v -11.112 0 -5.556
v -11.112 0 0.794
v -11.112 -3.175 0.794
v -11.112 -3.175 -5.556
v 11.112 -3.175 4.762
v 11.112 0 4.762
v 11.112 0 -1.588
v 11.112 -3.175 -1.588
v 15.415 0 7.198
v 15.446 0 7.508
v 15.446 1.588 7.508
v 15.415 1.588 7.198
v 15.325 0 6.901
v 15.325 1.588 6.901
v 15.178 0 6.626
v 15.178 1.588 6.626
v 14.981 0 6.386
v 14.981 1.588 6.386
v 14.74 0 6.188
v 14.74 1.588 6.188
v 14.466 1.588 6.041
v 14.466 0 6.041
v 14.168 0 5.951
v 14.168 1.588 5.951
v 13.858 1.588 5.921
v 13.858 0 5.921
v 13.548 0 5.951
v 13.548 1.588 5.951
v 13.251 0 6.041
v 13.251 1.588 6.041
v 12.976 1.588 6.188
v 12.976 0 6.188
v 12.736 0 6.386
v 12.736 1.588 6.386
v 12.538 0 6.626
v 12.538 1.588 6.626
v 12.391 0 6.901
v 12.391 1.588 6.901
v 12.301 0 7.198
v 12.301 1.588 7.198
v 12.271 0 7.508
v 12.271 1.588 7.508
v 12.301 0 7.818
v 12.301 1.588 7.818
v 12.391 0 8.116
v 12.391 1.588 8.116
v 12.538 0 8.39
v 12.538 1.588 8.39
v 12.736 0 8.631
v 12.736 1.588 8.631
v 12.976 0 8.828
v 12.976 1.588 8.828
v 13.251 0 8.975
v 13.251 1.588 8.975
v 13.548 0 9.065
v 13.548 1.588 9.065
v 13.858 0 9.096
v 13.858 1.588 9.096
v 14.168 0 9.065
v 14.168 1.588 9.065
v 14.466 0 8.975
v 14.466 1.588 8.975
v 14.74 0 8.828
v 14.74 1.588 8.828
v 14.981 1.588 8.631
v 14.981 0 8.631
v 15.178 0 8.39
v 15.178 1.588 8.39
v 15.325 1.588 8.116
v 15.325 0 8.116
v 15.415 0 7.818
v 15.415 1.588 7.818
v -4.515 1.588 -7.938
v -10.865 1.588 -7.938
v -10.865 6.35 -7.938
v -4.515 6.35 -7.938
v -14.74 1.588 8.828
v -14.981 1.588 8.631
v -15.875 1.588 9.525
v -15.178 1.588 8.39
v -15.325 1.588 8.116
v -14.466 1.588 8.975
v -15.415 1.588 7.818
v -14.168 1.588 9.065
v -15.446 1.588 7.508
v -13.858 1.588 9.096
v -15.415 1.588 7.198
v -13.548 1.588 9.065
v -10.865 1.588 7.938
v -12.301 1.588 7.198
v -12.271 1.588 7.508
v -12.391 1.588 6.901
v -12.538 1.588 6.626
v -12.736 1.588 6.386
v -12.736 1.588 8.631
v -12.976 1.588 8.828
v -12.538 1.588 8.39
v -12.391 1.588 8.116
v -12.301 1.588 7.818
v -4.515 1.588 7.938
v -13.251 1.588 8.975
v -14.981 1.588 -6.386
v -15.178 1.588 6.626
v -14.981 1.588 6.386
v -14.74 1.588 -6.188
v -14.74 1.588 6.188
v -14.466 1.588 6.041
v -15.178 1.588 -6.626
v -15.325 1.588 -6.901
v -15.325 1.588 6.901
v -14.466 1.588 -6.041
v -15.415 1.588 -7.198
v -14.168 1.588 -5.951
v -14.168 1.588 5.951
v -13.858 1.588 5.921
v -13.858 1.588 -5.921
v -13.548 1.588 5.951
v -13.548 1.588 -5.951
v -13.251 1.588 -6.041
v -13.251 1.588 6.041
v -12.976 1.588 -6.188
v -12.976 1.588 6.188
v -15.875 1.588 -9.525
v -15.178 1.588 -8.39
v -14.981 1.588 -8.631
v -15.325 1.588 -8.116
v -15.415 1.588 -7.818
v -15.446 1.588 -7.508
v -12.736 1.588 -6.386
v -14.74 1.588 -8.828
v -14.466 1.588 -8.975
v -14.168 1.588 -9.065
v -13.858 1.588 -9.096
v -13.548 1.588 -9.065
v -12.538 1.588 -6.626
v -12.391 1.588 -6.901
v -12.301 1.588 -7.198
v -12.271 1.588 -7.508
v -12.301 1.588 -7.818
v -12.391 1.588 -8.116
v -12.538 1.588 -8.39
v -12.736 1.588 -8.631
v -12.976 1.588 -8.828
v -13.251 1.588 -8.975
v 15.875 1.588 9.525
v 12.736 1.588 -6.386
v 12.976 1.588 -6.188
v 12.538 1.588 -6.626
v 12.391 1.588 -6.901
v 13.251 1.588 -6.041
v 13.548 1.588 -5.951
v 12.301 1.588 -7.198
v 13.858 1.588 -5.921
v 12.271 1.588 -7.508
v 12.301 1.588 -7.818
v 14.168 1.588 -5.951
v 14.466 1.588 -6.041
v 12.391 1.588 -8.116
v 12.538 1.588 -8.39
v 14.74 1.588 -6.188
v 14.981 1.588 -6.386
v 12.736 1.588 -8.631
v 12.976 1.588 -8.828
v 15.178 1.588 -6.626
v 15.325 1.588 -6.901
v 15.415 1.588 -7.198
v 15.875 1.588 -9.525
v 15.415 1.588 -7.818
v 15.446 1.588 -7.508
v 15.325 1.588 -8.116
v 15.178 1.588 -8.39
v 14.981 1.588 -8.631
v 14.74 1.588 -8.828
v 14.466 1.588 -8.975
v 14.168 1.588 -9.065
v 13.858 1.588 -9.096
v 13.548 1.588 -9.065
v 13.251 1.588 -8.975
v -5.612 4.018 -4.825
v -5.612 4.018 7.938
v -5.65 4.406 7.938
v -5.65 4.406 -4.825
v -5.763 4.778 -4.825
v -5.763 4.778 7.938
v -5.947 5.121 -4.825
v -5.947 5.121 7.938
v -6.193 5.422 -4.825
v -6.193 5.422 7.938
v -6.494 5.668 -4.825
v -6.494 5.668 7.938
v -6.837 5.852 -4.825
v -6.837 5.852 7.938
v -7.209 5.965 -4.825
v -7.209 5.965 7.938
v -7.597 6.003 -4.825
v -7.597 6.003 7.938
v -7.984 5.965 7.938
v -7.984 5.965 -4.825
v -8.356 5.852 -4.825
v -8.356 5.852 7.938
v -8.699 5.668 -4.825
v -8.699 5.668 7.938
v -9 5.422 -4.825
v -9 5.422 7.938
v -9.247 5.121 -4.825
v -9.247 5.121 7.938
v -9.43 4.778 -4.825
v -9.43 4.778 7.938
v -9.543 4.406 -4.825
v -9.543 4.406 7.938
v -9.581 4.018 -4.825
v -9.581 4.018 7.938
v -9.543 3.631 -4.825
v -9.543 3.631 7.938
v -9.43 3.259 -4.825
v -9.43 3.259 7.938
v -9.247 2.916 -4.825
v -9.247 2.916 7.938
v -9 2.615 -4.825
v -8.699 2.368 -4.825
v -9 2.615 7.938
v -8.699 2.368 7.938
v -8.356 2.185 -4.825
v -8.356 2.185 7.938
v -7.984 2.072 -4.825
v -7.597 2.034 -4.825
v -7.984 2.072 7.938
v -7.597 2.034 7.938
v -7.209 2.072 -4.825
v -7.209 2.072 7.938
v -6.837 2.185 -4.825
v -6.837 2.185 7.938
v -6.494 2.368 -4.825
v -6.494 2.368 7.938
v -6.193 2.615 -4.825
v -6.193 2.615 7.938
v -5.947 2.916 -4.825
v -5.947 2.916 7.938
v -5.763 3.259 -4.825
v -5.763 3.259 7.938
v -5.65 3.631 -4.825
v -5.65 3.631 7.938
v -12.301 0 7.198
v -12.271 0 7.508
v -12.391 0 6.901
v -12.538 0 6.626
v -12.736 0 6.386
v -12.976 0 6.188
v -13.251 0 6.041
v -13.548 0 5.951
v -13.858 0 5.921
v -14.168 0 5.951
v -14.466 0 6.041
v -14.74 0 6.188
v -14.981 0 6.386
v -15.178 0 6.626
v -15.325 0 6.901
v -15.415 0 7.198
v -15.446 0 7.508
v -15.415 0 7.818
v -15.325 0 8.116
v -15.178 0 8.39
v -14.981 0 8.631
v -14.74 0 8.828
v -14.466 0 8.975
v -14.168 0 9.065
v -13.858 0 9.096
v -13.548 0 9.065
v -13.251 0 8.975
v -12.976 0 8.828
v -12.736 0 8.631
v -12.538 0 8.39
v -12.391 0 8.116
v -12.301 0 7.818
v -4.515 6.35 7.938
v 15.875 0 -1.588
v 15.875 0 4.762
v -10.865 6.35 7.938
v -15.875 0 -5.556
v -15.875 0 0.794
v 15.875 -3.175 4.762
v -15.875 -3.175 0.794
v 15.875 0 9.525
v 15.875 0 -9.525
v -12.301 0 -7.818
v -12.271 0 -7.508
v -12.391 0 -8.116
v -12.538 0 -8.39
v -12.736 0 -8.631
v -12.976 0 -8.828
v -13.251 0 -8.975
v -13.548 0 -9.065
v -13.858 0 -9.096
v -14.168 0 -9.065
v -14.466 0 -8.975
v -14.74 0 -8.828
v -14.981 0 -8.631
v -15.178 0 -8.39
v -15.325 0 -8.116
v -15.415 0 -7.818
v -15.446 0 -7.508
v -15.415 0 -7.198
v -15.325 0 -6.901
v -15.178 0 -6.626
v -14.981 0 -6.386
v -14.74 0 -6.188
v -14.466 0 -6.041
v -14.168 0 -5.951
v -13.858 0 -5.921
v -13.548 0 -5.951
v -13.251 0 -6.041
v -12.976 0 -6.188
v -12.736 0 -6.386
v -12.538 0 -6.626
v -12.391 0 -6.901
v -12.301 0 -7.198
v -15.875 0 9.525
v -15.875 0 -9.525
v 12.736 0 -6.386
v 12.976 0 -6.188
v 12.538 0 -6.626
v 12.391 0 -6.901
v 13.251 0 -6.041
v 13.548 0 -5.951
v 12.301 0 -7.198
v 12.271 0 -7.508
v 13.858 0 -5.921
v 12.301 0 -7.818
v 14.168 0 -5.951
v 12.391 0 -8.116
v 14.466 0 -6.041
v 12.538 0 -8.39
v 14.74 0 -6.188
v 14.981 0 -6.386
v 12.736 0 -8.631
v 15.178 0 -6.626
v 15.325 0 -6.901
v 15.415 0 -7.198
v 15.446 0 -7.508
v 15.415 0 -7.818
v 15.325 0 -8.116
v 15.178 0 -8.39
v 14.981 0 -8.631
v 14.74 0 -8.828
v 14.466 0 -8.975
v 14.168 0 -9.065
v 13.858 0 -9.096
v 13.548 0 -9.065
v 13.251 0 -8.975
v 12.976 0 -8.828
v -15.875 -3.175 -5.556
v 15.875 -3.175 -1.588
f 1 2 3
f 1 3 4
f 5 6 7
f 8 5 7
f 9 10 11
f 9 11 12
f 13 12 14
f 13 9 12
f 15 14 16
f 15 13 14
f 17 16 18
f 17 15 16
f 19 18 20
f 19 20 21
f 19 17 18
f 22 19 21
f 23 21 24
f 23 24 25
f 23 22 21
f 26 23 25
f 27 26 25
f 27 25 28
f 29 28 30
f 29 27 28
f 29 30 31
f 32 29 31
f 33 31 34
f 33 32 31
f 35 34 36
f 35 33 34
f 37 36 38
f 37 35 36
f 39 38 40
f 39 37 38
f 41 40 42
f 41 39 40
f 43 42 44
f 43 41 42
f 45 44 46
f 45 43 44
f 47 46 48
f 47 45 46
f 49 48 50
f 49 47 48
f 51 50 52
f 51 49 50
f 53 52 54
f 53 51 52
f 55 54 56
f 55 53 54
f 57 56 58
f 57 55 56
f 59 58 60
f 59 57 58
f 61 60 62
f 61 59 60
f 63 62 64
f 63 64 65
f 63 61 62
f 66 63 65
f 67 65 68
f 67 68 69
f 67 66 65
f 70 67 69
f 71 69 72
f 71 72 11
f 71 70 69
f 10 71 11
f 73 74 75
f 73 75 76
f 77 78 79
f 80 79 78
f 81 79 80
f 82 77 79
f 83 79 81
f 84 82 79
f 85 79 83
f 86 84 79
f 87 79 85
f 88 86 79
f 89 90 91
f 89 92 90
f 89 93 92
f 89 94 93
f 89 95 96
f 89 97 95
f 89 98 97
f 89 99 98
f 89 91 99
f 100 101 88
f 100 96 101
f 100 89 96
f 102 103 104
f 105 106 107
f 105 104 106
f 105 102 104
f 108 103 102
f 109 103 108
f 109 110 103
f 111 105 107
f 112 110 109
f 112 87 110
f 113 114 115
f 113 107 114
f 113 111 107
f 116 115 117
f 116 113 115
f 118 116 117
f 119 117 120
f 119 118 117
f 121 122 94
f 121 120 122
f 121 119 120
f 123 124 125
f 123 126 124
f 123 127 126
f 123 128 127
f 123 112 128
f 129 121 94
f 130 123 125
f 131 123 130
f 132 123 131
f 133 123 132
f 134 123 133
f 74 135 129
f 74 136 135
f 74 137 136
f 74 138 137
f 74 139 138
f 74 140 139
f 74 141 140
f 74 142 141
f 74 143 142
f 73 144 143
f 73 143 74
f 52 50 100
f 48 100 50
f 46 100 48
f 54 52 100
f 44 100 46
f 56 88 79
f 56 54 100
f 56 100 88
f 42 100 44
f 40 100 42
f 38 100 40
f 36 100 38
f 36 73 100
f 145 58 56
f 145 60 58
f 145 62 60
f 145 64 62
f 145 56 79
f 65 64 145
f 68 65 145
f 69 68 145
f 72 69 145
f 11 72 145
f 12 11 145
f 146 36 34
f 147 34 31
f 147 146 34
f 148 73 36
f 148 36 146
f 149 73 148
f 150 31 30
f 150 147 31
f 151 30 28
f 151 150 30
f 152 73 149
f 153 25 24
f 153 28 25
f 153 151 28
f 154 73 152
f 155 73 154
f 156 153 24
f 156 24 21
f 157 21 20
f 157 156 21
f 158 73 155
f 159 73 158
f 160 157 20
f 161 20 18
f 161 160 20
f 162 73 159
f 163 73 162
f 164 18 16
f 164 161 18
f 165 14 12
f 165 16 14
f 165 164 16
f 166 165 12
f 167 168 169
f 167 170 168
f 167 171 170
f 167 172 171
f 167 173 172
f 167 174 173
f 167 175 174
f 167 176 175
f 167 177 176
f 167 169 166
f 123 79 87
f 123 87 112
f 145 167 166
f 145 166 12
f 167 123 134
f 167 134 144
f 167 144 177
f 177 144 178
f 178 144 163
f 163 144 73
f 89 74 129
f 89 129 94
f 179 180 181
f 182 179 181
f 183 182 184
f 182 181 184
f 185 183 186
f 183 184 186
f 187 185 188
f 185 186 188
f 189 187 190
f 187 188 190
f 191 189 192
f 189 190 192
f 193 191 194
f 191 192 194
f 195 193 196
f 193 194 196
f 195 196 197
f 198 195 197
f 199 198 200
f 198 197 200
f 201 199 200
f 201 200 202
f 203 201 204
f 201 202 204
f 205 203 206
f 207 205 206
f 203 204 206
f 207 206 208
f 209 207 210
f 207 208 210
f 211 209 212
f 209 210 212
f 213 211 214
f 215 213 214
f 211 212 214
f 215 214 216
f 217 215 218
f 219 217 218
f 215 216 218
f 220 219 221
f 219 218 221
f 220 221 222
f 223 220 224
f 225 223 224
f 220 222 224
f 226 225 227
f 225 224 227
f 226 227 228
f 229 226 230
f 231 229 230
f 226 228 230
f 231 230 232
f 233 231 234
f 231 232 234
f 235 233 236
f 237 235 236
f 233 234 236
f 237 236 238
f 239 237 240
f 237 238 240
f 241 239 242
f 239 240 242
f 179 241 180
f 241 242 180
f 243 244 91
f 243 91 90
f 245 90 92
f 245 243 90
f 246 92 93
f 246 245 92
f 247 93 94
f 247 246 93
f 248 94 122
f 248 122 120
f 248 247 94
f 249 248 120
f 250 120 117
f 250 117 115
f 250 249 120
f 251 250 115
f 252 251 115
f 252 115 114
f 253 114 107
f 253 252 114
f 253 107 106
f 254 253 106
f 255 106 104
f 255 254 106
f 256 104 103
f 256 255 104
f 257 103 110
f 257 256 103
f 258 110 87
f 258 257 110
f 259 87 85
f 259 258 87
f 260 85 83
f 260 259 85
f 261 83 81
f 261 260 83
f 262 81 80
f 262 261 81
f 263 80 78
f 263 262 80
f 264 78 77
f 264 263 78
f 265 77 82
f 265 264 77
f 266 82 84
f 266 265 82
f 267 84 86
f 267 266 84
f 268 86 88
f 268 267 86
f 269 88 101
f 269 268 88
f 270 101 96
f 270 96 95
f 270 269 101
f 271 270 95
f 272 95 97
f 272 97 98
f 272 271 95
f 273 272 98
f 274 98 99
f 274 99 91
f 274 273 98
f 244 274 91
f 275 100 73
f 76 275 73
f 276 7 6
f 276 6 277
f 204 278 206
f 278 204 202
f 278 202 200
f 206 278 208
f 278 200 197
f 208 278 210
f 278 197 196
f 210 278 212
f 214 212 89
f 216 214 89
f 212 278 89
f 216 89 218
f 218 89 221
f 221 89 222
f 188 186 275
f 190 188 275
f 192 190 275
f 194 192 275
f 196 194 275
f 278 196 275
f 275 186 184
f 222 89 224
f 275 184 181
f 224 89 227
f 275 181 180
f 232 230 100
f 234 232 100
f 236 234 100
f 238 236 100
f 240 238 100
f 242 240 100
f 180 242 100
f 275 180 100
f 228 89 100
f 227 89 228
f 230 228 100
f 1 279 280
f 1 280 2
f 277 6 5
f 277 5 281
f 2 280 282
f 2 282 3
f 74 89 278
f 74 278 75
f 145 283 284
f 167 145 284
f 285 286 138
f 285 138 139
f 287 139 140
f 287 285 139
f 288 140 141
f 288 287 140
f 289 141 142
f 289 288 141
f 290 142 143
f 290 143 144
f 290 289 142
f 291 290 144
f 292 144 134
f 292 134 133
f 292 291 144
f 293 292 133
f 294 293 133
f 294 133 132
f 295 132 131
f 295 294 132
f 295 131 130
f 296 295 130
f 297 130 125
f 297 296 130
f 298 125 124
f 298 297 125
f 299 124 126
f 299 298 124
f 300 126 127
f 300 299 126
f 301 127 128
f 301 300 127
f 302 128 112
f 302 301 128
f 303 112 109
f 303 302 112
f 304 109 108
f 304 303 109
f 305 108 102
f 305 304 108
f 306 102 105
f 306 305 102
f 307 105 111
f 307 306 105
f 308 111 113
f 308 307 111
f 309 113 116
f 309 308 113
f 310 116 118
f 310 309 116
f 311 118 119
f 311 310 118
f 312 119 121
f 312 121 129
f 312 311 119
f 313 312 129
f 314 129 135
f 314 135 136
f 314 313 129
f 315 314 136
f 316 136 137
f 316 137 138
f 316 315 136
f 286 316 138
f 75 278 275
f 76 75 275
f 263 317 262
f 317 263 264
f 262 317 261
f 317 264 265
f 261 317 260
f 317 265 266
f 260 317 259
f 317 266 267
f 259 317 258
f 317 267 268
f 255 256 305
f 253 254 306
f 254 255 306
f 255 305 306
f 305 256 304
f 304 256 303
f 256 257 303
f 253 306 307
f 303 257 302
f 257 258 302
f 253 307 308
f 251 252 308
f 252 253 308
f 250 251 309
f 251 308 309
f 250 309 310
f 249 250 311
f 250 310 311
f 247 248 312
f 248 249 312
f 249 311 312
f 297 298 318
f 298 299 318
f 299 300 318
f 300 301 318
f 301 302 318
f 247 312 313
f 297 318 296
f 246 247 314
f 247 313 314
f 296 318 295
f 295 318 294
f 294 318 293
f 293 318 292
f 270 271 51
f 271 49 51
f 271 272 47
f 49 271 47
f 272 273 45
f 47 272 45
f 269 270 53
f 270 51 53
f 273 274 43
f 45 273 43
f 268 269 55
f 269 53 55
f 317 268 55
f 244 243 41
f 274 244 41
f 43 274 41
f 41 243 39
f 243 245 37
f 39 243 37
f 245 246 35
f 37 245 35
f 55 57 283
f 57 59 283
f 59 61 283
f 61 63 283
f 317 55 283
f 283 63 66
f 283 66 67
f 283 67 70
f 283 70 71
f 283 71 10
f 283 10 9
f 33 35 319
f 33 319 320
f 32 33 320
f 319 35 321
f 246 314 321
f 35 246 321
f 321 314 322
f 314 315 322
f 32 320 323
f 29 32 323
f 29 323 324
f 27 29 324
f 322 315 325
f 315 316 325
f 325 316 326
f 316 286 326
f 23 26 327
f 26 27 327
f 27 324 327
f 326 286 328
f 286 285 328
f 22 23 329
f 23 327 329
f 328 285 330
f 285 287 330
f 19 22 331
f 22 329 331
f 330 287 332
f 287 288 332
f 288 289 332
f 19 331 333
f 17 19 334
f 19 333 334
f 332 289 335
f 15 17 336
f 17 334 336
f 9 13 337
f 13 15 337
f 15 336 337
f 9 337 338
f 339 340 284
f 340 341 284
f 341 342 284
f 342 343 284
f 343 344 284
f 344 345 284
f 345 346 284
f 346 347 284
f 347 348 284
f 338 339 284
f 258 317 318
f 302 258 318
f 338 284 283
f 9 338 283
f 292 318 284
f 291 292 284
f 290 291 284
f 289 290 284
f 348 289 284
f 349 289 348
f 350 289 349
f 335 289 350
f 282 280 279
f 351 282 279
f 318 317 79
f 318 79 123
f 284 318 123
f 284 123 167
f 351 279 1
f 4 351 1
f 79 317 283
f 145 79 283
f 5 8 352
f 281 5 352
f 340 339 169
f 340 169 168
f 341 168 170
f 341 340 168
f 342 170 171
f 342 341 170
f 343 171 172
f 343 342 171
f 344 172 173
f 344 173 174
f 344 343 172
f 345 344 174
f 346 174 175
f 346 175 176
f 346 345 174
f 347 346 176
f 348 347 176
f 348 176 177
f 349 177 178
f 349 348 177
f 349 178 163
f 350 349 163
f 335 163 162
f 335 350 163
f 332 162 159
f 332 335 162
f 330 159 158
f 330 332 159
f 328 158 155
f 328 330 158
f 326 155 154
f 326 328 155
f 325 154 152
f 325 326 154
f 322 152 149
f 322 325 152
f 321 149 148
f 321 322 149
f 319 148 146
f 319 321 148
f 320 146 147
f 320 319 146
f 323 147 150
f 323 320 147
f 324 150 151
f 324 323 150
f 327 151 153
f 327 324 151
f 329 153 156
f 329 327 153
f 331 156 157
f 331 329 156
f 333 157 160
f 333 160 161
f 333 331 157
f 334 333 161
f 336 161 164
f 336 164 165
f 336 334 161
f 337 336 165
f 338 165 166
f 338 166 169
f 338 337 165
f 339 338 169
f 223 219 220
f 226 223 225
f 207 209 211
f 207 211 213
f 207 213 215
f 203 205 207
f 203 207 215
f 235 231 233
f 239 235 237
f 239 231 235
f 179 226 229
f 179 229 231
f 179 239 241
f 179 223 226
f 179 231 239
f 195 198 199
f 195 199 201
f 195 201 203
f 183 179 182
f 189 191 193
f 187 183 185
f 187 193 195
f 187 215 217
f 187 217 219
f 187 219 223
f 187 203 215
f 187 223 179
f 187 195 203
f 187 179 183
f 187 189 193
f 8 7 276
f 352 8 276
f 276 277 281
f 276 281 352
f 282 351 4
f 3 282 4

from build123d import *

# Parameters (mm, degrees)
SKETCH2_W             = 31.75
SKETCH2_H             = 19.05
SKETCH2_R             = 1.5875
BOSS_EXTRUDE1_DEPTH   = 1.5875
SKETCH2_5_W           = 4.7625
SKETCH2_5_H           = 6.35
BOSS_EXTRUDE2_DEPTH   = 3.175
BOSS_EXTRUDE2_2_DEPTH = 3.175
BOSS_EXTRUDE3_START   = 1.5875
SKETCH2_6_W           = 6.35
SKETCH2_6_H           = 15.875
BOSS_EXTRUDE3_DEPTH   = 4.7625
SKETCH3_R             = 1.984375
CUT_EXTRUDE1_DEPTH    = 12.7625


with BuildPart() as part:
    # Sketch2 → Boss-Extrude1 (new body)
    with BuildSketch(Plane(origin=(0, 0, 0), x_dir=(1, 0, 0), z_dir=(0, 1, 0))):
        Rectangle(SKETCH2_W, SKETCH2_H)
        with Locations((-13.858094262, 7.508094262)):
            Circle(SKETCH2_R, mode=Mode.SUBTRACT)
        with Locations((-13.858094262, -7.508094262)):
            Circle(SKETCH2_R, mode=Mode.SUBTRACT)
        with Locations((13.858094262, -7.508094262)):
            Circle(SKETCH2_R, mode=Mode.SUBTRACT)
        with Locations((13.858094262, 7.508094262)):
            Circle(SKETCH2_R, mode=Mode.SUBTRACT)
    extrude(amount=BOSS_EXTRUDE1_DEPTH)

    # Sketch2<6> → Boss-Extrude3 (add)
    with BuildSketch(Plane(origin=(0, 0, 0), x_dir=(1, 0, 0), z_dir=(0, 1, 0)).offset(BOSS_EXTRUDE3_START)):
        with Locations((-7.690266393, 0)):
            Rectangle(SKETCH2_6_W, SKETCH2_6_H)
    extrude(amount=BOSS_EXTRUDE3_DEPTH)

    # Sketch3 → Cut-Extrude1 (cut)
    with BuildSketch(Plane.XY.offset(7.9375)):
        with Locations((-7.596610365, 4.018415317)):
            Circle(SKETCH3_R)
    extrude(amount=-CUT_EXTRUDE1_DEPTH, mode=Mode.SUBTRACT)


with BuildPart() as body_2:
    # Sketch2<5> → Boss-Extrude2 (new body)
    with BuildSketch(Plane(origin=(0, 0, 0), x_dir=(1, 0, 0), z_dir=(0, 1, 0))):
        with Locations((-13.49375, 2.38125)):
            Rectangle(SKETCH2_5_W, SKETCH2_5_H)
    extrude(amount=-BOSS_EXTRUDE2_DEPTH)


with BuildPart() as body_3:
    # Sketch2<5> → Boss-Extrude2 2 (new body)
    with BuildSketch(Plane(origin=(0, 0, 0), x_dir=(1, 0, 0), z_dir=(0, 1, 0))):
        with Locations((13.49375, -1.5875)):
            Rectangle(SKETCH2_5_W, SKETCH2_5_H)
    extrude(amount=-BOSS_EXTRUDE2_2_DEPTH)


solid = Compound([part.part, body_2.part, body_3.part])
